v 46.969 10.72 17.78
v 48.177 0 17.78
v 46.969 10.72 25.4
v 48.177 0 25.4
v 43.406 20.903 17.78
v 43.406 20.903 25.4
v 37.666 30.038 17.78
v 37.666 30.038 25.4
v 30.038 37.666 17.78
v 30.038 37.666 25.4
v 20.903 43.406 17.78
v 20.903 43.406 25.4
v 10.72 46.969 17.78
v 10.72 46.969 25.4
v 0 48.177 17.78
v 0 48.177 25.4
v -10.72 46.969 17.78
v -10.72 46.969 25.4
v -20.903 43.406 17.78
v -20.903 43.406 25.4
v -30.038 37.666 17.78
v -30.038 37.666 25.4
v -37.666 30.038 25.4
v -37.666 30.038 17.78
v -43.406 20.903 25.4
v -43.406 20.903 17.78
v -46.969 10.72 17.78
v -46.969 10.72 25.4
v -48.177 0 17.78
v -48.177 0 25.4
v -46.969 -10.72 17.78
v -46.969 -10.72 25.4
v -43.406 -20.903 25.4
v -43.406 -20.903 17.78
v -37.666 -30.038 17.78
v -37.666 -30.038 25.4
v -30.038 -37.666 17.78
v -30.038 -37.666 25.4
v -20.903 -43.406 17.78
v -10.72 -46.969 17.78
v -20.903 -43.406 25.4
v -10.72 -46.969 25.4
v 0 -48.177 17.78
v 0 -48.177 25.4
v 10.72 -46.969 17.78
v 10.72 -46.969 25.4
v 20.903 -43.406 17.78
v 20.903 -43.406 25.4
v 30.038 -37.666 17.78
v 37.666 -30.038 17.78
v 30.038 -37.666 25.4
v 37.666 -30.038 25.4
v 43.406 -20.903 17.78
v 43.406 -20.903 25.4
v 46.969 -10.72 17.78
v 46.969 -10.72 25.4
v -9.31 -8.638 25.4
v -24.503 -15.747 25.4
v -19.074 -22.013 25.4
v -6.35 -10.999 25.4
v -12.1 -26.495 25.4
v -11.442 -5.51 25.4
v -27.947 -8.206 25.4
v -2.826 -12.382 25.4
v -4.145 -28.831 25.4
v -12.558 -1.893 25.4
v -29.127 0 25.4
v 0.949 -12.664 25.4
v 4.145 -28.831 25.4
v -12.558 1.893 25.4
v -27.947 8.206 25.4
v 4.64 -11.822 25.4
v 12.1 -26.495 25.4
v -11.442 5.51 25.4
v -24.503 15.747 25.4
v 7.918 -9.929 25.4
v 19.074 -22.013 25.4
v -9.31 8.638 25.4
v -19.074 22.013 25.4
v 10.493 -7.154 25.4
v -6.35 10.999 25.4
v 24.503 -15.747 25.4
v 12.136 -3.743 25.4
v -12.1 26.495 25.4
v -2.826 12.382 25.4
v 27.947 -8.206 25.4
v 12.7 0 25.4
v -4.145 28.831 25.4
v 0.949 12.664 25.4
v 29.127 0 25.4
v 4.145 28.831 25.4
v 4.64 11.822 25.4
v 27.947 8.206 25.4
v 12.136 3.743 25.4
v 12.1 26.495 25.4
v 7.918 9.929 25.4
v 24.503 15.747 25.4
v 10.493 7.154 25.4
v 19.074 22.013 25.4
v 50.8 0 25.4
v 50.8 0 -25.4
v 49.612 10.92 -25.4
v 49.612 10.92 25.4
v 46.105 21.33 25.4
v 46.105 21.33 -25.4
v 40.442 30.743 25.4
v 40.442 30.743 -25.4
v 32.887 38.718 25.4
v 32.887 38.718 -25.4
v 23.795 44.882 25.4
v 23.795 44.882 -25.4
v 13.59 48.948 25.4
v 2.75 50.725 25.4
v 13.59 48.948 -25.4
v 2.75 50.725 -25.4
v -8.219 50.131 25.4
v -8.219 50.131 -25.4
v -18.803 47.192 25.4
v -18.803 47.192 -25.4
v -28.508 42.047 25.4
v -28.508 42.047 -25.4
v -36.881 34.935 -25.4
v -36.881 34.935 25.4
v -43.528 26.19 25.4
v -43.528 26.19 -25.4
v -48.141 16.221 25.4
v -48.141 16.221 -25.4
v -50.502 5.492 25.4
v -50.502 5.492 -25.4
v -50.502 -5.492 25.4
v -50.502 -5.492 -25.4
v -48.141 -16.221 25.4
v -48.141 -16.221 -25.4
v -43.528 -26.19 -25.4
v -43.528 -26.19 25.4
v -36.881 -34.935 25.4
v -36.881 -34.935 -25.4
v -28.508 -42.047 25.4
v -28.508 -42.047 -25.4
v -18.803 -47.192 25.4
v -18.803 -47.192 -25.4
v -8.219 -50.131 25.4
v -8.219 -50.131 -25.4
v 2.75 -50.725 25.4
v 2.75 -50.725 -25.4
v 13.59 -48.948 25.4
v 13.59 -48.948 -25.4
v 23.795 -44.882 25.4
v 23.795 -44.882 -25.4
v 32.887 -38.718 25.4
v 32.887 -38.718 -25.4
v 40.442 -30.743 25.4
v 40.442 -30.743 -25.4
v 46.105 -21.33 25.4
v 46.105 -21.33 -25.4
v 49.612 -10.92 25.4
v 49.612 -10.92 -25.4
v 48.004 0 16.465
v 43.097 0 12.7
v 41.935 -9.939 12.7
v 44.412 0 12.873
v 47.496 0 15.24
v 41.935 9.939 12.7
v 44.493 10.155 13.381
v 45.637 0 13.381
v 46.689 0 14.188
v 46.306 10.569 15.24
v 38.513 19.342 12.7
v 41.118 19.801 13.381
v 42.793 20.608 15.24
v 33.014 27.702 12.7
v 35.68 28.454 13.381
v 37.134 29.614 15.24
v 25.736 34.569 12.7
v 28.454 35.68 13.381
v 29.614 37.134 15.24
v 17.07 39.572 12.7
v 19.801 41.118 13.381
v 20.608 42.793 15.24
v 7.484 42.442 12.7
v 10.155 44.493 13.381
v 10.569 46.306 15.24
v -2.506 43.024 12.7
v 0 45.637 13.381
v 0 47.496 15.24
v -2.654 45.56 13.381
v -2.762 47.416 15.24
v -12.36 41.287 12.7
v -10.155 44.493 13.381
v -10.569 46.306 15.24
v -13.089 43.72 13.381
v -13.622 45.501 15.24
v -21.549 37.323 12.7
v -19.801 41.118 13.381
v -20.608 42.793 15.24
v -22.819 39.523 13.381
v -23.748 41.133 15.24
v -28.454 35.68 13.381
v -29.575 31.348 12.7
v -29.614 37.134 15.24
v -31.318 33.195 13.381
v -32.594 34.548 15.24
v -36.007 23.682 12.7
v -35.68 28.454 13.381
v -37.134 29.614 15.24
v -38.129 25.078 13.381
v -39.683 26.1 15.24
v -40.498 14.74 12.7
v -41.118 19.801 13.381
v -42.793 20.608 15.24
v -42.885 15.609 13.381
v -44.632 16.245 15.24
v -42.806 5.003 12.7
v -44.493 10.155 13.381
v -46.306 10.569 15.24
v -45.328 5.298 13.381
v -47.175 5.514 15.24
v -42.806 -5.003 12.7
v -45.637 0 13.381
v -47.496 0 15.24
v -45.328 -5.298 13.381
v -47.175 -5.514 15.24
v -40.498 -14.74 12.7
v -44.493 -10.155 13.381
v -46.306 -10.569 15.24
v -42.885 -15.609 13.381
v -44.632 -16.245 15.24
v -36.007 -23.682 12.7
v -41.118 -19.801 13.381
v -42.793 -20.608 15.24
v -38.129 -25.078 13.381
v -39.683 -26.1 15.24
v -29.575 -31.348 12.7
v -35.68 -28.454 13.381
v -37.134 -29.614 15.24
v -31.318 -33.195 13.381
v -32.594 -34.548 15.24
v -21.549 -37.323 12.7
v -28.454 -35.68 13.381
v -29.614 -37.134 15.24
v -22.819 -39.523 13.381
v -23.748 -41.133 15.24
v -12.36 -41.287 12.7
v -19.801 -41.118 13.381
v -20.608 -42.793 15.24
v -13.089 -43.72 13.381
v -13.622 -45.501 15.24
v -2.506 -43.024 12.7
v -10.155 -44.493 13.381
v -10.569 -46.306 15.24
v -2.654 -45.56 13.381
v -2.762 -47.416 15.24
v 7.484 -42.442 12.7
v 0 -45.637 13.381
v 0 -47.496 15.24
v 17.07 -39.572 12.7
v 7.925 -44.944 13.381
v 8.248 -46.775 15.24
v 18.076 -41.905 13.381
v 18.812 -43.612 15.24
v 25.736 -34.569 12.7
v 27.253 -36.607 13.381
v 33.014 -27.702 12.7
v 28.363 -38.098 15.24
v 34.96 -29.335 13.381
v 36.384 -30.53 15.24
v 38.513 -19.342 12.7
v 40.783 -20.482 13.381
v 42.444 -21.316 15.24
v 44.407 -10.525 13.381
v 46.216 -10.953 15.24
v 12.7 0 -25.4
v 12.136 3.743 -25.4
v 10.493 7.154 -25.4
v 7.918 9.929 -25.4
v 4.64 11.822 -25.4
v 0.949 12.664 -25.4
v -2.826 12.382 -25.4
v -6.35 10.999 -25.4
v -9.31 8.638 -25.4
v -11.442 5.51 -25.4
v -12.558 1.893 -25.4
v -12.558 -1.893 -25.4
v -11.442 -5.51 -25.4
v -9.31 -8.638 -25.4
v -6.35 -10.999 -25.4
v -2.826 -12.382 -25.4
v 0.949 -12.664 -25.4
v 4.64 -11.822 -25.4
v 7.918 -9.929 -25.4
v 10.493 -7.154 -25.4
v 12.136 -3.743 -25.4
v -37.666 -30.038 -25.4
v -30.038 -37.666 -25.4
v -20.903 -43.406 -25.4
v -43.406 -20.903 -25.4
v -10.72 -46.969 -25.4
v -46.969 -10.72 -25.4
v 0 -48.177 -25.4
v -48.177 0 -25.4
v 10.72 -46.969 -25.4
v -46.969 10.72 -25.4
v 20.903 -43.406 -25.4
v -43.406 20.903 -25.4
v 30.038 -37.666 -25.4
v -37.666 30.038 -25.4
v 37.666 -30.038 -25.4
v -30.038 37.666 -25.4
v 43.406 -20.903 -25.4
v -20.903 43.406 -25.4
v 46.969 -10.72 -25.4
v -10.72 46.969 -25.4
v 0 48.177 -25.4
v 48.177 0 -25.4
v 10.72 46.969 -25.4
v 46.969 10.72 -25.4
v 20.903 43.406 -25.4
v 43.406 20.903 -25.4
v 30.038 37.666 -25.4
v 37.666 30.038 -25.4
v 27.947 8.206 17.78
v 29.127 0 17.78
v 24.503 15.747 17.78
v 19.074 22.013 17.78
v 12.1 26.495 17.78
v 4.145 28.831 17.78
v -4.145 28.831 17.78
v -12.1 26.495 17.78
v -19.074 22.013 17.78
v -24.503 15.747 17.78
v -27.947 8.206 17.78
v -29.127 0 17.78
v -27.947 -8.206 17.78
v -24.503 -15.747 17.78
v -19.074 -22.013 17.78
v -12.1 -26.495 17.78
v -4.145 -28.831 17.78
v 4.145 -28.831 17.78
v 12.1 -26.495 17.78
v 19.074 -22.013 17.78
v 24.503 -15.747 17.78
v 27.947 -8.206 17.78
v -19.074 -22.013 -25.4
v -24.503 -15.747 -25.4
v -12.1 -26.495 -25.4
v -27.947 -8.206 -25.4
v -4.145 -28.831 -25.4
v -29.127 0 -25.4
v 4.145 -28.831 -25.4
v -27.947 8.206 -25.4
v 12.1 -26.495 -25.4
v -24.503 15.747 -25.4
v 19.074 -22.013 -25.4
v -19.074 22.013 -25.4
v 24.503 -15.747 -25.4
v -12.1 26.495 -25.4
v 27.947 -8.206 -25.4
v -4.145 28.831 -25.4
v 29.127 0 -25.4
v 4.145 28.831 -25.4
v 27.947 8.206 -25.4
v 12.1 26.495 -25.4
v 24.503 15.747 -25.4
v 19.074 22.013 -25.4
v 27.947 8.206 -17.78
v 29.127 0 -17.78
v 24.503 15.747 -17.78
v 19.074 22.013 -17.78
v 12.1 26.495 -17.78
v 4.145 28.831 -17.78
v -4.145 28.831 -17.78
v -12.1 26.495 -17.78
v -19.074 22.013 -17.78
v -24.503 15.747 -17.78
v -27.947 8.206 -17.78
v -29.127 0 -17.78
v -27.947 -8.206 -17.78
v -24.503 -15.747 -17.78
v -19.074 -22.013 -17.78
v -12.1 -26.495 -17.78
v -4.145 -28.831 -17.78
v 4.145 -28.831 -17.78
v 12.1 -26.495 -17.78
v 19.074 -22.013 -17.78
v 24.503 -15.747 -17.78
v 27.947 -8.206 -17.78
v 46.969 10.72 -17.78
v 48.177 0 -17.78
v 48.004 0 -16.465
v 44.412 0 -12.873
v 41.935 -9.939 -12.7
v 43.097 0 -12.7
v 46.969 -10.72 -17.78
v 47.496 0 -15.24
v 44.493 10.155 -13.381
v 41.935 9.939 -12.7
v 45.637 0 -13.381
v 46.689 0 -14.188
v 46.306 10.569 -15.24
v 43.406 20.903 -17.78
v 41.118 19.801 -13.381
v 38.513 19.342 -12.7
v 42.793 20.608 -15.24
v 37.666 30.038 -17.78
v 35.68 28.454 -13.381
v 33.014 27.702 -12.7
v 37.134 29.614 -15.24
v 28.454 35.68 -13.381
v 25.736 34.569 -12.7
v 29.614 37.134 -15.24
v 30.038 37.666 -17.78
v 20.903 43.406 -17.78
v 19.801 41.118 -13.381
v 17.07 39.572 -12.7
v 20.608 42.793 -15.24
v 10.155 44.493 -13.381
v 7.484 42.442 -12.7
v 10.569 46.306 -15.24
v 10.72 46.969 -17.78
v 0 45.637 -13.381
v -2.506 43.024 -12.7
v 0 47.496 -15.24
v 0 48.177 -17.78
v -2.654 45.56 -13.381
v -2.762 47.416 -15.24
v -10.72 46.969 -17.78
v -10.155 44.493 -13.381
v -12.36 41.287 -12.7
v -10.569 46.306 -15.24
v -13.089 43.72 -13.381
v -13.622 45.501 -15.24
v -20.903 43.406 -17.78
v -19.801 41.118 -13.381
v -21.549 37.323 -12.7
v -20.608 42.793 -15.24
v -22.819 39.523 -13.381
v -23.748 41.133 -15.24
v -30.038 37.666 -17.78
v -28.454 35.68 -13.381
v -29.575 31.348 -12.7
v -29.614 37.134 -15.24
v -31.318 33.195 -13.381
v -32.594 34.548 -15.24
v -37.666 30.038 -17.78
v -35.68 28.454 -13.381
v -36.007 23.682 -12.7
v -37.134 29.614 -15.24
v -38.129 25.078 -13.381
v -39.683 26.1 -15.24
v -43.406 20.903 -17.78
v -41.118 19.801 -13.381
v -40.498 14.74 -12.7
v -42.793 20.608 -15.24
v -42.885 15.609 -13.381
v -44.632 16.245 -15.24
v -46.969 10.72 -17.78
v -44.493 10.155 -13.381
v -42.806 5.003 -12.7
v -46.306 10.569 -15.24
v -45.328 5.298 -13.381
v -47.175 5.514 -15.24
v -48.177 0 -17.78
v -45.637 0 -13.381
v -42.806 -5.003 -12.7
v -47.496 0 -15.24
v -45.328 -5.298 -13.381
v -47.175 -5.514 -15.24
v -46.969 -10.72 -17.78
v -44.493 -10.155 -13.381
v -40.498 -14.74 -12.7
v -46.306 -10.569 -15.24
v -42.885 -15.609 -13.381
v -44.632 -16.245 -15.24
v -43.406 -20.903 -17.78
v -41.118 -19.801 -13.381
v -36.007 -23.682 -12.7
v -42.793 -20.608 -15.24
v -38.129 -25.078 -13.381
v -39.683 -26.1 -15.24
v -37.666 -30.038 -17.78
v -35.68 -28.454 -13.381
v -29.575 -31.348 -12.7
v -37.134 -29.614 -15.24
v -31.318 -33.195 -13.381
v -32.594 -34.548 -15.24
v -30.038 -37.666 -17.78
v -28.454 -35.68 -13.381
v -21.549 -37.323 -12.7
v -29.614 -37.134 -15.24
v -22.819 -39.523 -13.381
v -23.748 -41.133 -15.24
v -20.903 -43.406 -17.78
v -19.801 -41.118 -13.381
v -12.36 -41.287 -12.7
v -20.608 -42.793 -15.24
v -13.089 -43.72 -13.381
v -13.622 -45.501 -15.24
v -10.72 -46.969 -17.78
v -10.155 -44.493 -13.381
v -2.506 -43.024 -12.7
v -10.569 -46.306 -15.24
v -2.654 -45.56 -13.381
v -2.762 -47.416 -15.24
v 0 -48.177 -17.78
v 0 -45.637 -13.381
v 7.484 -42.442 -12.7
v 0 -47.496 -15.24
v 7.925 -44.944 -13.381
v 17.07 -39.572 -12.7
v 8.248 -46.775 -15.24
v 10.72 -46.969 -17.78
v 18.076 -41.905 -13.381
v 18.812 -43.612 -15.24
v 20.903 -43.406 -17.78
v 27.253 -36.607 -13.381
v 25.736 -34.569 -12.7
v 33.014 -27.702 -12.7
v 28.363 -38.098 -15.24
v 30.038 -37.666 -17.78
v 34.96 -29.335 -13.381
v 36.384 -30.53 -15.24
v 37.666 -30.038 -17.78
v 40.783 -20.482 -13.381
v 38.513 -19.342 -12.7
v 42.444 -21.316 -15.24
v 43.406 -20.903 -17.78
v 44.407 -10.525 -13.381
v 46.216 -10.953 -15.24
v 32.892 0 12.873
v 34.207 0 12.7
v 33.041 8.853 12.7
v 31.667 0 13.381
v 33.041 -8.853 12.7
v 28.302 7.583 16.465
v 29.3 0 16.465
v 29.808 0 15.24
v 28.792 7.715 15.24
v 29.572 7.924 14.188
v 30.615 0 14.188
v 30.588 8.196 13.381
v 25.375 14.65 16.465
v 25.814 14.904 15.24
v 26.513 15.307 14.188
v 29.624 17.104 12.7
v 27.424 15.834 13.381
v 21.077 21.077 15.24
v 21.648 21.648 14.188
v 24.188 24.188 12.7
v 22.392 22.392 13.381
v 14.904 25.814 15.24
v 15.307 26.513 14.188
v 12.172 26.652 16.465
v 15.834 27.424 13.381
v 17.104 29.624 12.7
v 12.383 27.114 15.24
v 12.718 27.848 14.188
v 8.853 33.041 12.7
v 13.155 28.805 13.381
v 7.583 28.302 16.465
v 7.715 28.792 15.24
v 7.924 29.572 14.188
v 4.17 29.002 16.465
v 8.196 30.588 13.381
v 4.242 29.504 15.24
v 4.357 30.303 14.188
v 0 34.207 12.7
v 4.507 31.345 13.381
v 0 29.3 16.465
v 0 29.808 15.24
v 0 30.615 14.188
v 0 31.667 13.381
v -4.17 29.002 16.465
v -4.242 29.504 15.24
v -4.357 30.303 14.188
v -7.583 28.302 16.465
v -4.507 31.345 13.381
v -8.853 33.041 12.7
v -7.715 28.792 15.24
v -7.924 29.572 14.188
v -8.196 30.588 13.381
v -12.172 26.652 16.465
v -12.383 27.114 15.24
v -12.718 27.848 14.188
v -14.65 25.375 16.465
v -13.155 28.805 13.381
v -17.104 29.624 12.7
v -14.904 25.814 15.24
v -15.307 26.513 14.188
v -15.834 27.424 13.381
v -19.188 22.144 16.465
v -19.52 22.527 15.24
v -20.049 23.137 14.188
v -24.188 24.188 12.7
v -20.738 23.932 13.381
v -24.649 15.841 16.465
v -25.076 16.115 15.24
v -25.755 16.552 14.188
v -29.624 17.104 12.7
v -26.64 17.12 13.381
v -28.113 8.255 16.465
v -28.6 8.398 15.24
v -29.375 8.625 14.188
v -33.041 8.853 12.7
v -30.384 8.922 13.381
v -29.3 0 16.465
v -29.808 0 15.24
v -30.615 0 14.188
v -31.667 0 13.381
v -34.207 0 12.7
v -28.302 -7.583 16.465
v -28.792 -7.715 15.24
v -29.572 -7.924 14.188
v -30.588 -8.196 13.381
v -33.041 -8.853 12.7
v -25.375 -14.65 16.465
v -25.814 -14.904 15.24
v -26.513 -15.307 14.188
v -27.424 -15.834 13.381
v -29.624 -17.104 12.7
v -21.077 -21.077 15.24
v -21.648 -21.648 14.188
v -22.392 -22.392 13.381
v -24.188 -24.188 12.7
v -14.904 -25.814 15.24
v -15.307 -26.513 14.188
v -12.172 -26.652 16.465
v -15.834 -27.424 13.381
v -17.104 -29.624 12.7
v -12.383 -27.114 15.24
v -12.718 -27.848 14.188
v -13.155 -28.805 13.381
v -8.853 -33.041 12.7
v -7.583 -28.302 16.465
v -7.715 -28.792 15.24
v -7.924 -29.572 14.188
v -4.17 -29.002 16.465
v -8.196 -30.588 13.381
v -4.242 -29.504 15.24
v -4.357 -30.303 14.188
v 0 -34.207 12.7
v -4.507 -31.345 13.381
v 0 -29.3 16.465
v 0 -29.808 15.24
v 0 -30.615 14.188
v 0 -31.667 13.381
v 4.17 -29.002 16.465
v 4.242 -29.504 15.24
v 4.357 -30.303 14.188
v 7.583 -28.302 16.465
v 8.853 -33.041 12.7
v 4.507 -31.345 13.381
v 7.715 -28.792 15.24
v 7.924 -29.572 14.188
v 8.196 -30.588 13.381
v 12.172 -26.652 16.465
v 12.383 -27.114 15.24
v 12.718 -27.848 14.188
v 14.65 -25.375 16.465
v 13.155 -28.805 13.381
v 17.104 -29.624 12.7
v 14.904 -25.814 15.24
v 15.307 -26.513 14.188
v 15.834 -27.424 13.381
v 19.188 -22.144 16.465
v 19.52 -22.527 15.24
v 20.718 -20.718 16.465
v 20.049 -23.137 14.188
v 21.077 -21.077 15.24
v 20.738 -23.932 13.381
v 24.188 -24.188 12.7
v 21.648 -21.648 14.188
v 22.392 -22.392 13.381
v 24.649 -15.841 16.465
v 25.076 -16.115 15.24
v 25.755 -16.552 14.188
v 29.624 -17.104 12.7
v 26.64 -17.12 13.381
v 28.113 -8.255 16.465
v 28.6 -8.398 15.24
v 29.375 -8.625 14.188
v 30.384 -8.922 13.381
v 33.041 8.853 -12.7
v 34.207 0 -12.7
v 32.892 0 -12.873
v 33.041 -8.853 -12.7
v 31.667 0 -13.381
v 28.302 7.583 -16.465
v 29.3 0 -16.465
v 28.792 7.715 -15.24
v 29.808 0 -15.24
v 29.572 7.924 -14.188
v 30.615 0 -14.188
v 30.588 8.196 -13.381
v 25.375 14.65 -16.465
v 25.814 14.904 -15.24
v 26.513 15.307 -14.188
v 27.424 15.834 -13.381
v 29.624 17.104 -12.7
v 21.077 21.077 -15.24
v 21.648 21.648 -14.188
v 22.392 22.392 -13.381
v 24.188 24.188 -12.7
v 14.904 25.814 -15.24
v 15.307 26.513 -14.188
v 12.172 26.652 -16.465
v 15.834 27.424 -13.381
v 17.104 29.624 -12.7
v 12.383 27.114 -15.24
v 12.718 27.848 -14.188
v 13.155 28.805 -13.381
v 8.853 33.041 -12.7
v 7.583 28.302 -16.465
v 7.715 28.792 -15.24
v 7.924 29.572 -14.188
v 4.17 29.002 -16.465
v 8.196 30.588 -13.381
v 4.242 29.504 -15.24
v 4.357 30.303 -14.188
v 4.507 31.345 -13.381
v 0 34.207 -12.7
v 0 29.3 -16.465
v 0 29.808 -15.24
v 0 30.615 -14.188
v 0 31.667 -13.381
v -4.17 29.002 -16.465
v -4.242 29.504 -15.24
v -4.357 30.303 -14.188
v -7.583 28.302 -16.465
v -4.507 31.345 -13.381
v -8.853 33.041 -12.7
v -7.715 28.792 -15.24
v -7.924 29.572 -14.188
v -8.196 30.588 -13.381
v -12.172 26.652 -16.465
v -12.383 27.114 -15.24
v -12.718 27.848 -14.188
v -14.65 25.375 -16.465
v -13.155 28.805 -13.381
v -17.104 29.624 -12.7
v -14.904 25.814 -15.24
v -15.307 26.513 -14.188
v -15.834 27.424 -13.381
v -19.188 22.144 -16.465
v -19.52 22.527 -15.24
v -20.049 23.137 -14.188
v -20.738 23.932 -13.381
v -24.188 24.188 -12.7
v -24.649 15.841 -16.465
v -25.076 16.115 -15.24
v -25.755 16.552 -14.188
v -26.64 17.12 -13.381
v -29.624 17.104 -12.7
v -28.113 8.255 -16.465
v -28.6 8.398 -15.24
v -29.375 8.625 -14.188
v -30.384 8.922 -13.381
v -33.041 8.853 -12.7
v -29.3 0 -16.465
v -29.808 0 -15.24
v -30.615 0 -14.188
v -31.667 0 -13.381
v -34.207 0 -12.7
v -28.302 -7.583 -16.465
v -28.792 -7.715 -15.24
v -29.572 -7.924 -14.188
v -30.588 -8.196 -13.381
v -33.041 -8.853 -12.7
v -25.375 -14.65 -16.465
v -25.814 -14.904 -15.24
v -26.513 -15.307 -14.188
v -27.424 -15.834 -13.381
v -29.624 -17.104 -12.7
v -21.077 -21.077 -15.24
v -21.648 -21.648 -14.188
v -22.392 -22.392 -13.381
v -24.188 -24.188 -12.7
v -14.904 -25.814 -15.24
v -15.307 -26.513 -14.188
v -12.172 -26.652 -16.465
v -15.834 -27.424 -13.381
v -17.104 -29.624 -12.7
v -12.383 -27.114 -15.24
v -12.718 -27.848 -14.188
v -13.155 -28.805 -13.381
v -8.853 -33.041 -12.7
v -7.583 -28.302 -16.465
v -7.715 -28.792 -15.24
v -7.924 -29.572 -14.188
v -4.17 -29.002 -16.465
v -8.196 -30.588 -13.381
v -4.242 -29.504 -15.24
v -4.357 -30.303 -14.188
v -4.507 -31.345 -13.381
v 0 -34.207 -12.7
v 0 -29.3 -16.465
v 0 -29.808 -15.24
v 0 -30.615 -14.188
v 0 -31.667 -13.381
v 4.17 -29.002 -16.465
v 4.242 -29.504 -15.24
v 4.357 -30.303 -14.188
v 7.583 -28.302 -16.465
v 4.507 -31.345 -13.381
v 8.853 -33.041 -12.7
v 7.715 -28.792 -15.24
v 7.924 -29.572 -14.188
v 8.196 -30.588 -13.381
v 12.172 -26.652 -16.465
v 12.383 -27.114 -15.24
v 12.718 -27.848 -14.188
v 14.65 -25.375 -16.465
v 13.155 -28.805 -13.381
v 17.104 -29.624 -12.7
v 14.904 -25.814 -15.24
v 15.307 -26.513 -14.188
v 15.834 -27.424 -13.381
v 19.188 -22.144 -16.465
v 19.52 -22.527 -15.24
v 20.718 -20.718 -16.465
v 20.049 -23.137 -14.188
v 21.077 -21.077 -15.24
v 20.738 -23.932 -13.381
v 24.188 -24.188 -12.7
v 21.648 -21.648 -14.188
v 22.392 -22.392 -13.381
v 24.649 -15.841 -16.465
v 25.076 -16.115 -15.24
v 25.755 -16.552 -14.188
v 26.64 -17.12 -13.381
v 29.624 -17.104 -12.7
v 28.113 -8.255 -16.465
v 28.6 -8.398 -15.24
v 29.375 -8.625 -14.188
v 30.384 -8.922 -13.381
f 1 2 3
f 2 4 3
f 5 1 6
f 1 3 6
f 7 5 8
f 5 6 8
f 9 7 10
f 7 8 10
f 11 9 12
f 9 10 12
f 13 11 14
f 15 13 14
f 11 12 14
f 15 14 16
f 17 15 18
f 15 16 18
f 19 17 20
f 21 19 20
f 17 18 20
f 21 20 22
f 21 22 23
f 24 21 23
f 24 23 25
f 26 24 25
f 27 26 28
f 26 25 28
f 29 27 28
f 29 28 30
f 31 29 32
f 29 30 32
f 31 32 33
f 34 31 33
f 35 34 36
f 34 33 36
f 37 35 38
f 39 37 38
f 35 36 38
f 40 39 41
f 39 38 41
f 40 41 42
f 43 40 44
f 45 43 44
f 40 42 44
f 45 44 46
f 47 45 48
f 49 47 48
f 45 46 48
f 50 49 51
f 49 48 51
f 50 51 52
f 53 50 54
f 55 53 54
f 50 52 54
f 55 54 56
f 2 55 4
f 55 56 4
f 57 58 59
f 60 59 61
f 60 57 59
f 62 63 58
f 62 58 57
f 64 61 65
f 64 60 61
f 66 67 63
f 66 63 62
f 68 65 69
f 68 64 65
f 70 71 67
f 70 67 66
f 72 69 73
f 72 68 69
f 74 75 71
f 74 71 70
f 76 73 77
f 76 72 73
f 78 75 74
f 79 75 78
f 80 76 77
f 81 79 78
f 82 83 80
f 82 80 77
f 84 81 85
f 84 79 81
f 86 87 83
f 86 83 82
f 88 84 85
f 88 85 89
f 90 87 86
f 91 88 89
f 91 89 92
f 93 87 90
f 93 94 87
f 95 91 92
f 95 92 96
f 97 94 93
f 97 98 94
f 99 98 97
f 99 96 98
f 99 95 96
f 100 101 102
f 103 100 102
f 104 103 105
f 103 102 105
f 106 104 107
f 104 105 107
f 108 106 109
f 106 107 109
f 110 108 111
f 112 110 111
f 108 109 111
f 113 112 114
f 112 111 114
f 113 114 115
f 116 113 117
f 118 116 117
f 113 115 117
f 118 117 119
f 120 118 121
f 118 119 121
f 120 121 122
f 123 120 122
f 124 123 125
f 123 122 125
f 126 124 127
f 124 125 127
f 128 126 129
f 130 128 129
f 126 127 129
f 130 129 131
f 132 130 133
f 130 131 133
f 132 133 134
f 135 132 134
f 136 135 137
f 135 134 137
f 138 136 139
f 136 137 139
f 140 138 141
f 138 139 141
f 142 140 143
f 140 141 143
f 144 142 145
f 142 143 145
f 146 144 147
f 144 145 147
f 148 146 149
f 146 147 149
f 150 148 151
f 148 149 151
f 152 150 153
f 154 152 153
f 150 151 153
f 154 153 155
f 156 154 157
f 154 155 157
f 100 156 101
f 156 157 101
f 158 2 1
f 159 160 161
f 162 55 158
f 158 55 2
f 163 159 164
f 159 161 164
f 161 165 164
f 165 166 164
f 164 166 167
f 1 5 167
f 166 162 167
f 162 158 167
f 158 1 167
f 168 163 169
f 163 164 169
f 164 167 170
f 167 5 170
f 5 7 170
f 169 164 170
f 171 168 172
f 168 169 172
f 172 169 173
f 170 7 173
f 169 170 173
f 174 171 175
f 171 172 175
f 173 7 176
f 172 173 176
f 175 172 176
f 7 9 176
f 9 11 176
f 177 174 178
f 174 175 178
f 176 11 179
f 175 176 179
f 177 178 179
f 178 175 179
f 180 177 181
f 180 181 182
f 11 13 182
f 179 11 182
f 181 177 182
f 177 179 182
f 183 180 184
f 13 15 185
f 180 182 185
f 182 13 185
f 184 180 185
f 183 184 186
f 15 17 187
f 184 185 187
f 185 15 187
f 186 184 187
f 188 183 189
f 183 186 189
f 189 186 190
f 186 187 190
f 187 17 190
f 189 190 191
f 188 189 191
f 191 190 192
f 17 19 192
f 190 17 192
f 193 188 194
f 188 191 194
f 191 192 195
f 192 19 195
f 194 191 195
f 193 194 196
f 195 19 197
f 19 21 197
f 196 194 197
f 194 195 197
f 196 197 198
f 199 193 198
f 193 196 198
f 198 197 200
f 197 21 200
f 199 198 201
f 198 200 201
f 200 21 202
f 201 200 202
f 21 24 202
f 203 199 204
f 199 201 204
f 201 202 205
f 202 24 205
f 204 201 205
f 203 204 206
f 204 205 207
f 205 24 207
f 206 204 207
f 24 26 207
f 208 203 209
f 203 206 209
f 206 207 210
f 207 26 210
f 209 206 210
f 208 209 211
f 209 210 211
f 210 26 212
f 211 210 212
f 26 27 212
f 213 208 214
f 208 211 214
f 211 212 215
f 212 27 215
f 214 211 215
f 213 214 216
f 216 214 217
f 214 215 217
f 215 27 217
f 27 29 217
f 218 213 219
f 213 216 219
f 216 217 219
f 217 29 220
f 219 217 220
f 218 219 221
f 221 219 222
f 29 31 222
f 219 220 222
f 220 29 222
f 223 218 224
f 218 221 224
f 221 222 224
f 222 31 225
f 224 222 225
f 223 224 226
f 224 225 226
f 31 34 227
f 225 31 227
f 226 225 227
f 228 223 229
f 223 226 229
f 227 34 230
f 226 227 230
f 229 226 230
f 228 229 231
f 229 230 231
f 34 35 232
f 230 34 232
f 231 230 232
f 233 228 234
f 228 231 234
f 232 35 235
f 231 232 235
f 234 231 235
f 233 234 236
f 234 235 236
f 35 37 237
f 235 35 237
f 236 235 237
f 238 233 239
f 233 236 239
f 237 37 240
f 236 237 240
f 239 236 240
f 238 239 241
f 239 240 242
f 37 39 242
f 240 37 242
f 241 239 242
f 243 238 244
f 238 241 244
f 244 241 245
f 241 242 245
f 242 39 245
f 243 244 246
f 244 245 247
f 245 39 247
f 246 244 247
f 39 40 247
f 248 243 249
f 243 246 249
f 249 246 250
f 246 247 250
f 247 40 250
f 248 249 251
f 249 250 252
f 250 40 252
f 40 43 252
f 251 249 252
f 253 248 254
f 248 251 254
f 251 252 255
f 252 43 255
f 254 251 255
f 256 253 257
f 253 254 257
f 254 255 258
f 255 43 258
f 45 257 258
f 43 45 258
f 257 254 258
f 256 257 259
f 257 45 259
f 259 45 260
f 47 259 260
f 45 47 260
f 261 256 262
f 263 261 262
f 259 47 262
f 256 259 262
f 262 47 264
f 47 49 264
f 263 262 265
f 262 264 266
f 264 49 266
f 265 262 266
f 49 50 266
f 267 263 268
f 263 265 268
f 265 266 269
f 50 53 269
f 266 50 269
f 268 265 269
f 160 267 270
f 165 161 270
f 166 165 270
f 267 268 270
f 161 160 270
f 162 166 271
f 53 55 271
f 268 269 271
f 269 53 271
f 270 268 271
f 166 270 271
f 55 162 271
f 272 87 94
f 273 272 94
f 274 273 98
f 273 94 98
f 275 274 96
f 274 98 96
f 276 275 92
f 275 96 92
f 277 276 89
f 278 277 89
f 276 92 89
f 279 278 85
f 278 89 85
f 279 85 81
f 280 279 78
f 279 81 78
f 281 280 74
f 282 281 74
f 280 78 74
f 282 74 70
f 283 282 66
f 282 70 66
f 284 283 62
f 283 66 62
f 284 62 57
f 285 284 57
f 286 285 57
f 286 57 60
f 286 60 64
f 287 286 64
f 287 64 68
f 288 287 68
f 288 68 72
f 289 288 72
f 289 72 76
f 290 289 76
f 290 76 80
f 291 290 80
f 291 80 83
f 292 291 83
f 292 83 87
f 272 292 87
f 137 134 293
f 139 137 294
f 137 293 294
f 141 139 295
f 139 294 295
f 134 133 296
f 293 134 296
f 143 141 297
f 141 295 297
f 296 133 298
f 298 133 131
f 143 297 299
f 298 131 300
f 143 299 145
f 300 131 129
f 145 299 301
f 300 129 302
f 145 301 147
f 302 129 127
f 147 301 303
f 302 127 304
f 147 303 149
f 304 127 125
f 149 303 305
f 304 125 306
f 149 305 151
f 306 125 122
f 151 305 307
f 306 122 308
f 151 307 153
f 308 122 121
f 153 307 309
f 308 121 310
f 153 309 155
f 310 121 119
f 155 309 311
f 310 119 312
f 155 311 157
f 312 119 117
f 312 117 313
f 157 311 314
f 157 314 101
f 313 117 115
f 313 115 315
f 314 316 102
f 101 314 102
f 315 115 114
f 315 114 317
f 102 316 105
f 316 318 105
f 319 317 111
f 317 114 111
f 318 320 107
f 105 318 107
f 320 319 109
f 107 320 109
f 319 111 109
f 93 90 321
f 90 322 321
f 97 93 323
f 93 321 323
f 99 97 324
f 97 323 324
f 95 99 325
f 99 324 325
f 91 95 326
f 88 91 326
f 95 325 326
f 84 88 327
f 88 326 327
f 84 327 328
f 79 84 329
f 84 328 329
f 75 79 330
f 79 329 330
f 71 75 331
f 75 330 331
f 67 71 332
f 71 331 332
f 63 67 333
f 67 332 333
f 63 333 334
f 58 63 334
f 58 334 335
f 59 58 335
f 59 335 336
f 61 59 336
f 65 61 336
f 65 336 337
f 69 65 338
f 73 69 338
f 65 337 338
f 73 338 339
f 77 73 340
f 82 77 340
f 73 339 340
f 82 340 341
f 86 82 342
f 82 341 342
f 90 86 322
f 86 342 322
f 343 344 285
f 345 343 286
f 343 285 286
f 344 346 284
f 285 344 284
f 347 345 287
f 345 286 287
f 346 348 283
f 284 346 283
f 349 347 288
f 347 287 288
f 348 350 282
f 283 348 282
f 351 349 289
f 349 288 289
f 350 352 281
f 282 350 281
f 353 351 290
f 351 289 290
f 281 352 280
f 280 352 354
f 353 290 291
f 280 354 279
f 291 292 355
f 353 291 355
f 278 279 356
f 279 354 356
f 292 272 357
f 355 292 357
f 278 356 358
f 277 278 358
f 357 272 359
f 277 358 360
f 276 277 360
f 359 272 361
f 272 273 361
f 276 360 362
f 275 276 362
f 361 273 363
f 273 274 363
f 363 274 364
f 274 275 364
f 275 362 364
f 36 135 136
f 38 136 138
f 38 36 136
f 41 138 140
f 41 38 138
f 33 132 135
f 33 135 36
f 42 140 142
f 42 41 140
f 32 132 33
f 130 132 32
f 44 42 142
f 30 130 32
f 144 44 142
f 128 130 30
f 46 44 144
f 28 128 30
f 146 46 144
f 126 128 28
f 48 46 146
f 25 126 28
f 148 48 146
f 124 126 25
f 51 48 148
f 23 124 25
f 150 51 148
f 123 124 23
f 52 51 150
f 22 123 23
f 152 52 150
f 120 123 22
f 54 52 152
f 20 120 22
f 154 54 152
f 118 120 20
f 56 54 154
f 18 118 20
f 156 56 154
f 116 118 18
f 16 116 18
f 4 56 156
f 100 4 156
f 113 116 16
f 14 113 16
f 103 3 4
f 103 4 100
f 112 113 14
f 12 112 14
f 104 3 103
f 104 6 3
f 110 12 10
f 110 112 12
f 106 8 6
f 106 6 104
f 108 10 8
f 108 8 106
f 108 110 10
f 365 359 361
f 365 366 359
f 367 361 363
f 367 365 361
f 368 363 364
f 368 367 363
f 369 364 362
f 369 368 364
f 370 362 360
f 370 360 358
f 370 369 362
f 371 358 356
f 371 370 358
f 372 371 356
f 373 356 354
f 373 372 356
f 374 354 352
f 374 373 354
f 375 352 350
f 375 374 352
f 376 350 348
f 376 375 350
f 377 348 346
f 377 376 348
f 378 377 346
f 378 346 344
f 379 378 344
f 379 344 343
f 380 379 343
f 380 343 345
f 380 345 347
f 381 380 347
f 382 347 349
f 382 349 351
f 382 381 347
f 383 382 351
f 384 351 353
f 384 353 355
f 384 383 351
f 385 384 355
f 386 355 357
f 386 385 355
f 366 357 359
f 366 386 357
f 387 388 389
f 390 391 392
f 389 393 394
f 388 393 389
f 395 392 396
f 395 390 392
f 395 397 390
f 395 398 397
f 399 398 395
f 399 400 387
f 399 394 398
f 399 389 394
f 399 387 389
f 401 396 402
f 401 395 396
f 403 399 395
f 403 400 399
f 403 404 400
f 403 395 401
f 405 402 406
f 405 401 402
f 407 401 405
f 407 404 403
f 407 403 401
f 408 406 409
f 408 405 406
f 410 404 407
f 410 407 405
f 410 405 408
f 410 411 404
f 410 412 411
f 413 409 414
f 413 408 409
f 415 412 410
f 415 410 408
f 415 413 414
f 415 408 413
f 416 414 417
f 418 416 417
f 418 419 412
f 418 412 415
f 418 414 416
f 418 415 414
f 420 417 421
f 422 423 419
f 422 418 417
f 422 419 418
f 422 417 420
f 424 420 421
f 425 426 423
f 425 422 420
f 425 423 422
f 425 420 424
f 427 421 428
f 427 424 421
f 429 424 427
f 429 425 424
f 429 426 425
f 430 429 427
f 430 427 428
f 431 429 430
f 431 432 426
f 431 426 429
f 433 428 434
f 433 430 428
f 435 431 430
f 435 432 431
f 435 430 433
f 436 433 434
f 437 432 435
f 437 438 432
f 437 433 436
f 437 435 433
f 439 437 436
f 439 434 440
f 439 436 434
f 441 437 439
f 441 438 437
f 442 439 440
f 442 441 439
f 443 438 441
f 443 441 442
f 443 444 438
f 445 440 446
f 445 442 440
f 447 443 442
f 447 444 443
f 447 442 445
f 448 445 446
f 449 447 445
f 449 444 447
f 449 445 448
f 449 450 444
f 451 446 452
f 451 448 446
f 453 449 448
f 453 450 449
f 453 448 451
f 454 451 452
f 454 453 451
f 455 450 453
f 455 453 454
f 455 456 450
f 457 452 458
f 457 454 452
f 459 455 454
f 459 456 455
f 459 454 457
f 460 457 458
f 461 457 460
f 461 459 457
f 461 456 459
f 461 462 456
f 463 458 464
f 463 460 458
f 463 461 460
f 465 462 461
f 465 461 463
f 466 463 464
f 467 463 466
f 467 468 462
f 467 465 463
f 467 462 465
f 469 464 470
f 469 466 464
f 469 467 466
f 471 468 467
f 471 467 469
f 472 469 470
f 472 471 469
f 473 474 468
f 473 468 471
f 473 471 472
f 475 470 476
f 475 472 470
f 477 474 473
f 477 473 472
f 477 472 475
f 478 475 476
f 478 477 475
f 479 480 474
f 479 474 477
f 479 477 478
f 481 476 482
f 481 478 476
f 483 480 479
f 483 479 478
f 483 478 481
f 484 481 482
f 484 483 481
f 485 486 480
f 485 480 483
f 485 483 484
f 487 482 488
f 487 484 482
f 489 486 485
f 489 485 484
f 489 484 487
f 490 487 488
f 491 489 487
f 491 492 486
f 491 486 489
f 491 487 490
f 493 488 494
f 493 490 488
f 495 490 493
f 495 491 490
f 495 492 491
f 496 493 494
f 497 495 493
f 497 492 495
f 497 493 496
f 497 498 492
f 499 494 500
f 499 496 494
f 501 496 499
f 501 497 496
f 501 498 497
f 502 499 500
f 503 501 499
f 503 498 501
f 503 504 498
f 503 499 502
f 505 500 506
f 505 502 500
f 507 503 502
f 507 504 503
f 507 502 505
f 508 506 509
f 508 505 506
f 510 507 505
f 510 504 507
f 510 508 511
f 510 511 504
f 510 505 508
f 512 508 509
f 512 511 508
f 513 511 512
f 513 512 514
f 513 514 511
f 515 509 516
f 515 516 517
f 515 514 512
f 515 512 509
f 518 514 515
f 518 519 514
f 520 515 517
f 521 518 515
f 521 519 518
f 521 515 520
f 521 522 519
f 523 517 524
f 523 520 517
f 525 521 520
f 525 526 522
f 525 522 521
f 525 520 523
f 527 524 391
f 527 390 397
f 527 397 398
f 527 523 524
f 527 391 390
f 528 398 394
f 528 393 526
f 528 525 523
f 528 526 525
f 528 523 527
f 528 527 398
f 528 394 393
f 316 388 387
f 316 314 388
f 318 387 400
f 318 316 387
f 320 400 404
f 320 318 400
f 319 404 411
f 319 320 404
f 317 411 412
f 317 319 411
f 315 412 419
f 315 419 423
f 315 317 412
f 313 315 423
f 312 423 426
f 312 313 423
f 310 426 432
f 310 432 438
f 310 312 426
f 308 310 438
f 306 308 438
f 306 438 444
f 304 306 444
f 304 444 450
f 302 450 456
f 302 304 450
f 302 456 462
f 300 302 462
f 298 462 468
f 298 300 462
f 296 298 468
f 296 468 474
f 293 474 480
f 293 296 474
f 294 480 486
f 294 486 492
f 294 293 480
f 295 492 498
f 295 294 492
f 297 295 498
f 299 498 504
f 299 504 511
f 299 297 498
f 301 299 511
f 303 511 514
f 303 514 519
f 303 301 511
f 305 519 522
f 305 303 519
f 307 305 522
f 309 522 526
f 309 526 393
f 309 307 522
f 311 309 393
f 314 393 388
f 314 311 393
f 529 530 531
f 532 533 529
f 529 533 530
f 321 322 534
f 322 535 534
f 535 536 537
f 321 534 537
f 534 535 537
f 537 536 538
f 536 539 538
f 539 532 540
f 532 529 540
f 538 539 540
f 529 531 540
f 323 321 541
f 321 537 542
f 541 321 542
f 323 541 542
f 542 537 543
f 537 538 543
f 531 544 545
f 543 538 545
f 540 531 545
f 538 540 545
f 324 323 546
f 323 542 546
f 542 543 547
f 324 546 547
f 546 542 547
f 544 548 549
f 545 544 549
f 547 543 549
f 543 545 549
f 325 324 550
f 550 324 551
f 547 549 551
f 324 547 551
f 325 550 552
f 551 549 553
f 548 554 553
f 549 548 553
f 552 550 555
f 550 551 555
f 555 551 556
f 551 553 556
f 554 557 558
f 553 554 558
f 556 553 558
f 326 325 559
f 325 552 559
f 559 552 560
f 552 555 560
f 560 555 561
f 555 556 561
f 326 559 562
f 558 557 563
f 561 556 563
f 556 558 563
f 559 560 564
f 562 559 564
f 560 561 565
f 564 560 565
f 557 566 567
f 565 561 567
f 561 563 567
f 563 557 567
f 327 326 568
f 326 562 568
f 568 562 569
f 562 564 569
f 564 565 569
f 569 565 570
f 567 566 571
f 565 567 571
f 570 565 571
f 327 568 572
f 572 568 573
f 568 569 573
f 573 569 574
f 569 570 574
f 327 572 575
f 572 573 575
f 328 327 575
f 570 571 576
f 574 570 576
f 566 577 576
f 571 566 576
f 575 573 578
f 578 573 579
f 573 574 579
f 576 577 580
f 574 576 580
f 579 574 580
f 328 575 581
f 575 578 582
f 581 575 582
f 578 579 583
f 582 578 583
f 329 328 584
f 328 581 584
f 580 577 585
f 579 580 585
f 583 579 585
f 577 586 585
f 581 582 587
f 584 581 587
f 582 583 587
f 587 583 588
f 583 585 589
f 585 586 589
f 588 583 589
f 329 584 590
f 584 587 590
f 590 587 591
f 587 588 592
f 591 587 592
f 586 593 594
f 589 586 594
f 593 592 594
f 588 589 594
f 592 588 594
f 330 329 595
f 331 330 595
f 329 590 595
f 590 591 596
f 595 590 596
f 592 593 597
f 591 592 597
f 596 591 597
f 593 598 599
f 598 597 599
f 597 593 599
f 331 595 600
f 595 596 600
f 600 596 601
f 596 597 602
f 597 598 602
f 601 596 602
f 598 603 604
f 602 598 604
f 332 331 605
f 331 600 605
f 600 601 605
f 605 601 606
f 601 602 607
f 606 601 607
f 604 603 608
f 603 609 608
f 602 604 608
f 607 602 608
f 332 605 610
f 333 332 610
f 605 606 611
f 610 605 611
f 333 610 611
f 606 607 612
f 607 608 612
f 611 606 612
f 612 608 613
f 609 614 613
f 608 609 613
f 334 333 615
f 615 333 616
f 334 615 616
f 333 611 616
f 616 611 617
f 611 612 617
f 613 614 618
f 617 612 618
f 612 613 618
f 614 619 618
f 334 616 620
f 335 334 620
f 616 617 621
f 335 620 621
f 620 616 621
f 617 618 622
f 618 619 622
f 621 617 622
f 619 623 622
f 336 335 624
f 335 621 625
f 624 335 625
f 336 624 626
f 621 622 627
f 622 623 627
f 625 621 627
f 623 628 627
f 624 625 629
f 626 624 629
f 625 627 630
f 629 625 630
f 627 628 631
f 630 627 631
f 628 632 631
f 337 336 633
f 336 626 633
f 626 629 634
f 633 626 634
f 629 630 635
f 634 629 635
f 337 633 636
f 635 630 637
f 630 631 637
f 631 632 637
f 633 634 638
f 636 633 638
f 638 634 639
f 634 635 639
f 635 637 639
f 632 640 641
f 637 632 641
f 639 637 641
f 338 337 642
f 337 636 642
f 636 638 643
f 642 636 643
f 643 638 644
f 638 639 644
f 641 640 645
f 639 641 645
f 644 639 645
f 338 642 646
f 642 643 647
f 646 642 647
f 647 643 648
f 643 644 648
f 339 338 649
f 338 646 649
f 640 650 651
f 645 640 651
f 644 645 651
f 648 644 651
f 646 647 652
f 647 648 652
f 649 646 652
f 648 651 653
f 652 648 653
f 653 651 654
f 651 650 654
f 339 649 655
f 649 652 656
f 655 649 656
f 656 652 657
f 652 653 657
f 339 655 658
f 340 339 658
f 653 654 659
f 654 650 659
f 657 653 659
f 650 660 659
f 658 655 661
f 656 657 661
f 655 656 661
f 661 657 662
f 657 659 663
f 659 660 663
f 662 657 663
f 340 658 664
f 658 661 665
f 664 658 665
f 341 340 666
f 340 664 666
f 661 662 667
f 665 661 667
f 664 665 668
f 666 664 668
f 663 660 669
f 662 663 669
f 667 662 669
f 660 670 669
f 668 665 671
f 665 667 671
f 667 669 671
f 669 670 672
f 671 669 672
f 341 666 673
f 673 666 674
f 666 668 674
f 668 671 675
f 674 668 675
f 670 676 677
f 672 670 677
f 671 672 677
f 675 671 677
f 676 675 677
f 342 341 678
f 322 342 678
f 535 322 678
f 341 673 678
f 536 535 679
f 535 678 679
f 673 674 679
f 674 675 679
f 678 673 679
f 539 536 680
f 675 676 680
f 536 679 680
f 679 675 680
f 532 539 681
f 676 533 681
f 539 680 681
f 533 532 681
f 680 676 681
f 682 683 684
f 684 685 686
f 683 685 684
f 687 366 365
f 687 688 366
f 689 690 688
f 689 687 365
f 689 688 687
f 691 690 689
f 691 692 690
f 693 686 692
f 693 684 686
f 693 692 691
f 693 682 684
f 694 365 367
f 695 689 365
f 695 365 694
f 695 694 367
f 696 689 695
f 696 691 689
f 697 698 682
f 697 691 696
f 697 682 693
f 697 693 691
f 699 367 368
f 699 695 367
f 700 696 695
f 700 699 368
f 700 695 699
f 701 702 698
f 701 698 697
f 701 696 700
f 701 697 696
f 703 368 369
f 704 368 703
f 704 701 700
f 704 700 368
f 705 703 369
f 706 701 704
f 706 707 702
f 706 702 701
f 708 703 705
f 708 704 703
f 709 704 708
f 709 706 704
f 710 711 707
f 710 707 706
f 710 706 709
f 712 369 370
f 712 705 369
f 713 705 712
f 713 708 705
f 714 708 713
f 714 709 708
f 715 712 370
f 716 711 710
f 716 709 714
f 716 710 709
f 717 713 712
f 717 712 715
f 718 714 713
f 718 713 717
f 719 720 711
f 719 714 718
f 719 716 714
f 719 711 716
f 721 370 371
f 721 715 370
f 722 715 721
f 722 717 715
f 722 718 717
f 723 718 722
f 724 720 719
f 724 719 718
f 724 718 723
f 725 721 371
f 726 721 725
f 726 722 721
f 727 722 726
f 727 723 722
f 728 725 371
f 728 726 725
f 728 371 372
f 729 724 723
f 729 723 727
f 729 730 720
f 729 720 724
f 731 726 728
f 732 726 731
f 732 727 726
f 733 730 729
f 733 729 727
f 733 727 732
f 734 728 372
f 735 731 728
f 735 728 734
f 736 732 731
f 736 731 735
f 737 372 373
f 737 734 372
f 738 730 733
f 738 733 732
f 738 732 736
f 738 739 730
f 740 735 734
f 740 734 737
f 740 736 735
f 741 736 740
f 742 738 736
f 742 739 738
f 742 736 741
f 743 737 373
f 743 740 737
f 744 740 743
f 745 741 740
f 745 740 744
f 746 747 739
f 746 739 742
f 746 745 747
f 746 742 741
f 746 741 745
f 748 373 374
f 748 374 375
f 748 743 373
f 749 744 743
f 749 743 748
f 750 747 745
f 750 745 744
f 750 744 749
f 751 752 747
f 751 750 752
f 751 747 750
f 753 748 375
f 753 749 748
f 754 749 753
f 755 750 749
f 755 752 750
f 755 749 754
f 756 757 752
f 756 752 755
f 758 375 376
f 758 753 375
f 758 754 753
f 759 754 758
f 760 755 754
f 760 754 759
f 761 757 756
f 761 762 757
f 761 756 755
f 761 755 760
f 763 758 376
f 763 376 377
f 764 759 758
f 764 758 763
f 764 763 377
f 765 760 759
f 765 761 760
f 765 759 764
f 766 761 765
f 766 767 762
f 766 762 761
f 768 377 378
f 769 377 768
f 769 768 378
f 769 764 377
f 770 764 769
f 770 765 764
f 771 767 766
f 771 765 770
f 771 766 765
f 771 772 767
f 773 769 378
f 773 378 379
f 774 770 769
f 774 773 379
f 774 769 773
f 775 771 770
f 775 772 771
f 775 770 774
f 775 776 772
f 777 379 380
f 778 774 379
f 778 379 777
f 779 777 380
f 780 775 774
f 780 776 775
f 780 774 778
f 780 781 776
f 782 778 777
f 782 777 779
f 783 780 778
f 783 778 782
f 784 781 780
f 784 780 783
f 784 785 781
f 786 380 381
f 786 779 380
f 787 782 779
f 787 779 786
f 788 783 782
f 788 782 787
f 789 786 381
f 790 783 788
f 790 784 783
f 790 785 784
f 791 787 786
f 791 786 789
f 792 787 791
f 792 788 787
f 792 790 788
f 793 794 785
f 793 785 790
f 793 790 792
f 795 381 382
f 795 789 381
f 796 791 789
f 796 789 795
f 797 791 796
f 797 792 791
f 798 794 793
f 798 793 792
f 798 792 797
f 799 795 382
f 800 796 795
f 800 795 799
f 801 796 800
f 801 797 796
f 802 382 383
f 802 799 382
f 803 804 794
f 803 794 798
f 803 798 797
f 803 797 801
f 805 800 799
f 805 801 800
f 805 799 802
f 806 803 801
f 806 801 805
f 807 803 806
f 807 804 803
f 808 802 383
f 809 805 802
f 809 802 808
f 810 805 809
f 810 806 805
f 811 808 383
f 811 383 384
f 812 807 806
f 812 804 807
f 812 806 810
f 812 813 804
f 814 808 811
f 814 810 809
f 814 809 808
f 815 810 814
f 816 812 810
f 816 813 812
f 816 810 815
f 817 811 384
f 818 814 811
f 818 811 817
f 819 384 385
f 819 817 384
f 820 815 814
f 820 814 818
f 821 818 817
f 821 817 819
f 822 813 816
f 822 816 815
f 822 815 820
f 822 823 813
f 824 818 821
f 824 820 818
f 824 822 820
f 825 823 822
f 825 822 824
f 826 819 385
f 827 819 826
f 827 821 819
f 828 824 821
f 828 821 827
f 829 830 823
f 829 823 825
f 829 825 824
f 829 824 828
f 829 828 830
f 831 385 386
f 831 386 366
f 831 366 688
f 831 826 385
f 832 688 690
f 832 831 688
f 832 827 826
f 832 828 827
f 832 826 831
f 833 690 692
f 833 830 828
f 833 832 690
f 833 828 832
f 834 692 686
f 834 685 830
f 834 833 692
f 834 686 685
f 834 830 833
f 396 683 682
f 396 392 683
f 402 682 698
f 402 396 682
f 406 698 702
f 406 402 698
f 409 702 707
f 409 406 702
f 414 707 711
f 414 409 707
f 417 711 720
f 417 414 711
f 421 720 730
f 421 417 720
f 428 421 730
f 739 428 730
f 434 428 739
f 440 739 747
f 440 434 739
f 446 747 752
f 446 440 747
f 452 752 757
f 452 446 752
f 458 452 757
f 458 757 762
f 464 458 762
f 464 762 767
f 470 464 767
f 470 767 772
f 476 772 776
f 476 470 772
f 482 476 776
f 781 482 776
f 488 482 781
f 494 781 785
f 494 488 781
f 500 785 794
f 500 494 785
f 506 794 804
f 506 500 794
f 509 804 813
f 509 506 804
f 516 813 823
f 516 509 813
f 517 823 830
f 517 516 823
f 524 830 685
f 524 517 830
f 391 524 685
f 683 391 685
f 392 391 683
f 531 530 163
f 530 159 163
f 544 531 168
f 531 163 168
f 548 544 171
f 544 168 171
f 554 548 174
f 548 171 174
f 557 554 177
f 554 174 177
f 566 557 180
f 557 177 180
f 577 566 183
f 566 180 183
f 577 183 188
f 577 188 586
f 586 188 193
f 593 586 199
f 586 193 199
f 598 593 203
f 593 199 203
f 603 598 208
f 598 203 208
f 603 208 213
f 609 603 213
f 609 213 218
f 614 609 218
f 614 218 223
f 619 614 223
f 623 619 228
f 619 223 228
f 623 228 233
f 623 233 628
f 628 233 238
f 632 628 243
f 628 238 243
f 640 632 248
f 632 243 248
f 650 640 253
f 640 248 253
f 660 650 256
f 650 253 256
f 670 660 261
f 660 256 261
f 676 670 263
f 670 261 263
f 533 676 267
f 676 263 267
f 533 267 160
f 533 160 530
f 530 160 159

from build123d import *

# Parameters (mm, degrees)
BOSS_EXTRUDE1_DEPTH      = 25.4
BOSS_EXTRUDE1_DEPTH_BACK = 25.4
SKETCH1_R                = 50.8
SKETCH3_R                = 12.7
CUT_EXTRUDE2_DEPTH       = 88.988181024


with BuildPart() as part:
    # Sketch1 → Boss-Extrude1 (new, two sides: drawn at the far end of the back side and taken through both)
    with BuildSketch(Plane.XY.offset(-BOSS_EXTRUDE1_DEPTH_BACK)):
        Circle(SKETCH1_R)
    extrude(amount=BOSS_EXTRUDE1_DEPTH + BOSS_EXTRUDE1_DEPTH_BACK)

    # Sketch3 → Cut-Extrude2 (cut, through all)
    with BuildSketch(Plane.XY.offset(25.4)):
        Circle(SKETCH3_R)
    extrude(amount=-CUT_EXTRUDE2_DEPTH, mode=Mode.SUBTRACT)

    # Cut-Sweep1: sweep along a path in Sketch4
    with BuildLine(Plane.XY.offset(25.4)) as cut_sweep1_path:
        CenterArc((0, 0), 38.1, 0, 360)
    # Sketch7 → Cut-Sweep1 (sweep, cut)
    with BuildSketch(Plane(origin=(0, 0, 0), x_dir=(0, 0, -1), z_dir=(1, 0, 0))):
        with BuildLine():
            Line((-25.4, 48.177038495), (-17.78, 48.177038495))
            ThreePointArc((-17.78, 48.177038495), (-14.187897552, 46.689140943), (-12.7, 43.097038495))
            Line((-12.7, 43.097038495), (-12.7, 34.207038495))
            ThreePointArc((-12.7, 34.207038495), (-14.187897552, 30.614936046), (-17.78, 29.127038495))
            Line((-17.78, 29.127038495), (-25.4, 29.127038495))
            Line((-25.4, 29.127038495), (-25.4, 48.177038495))
        make_face()
    cut_sweep1 = sweep(path=cut_sweep1_path.line, mode=Mode.SUBTRACT)

    # Mirror1: Cut-Sweep1 across plane
    add(cut_sweep1.mirror(Plane.XY), mode=Mode.SUBTRACT)


solid = part.part
